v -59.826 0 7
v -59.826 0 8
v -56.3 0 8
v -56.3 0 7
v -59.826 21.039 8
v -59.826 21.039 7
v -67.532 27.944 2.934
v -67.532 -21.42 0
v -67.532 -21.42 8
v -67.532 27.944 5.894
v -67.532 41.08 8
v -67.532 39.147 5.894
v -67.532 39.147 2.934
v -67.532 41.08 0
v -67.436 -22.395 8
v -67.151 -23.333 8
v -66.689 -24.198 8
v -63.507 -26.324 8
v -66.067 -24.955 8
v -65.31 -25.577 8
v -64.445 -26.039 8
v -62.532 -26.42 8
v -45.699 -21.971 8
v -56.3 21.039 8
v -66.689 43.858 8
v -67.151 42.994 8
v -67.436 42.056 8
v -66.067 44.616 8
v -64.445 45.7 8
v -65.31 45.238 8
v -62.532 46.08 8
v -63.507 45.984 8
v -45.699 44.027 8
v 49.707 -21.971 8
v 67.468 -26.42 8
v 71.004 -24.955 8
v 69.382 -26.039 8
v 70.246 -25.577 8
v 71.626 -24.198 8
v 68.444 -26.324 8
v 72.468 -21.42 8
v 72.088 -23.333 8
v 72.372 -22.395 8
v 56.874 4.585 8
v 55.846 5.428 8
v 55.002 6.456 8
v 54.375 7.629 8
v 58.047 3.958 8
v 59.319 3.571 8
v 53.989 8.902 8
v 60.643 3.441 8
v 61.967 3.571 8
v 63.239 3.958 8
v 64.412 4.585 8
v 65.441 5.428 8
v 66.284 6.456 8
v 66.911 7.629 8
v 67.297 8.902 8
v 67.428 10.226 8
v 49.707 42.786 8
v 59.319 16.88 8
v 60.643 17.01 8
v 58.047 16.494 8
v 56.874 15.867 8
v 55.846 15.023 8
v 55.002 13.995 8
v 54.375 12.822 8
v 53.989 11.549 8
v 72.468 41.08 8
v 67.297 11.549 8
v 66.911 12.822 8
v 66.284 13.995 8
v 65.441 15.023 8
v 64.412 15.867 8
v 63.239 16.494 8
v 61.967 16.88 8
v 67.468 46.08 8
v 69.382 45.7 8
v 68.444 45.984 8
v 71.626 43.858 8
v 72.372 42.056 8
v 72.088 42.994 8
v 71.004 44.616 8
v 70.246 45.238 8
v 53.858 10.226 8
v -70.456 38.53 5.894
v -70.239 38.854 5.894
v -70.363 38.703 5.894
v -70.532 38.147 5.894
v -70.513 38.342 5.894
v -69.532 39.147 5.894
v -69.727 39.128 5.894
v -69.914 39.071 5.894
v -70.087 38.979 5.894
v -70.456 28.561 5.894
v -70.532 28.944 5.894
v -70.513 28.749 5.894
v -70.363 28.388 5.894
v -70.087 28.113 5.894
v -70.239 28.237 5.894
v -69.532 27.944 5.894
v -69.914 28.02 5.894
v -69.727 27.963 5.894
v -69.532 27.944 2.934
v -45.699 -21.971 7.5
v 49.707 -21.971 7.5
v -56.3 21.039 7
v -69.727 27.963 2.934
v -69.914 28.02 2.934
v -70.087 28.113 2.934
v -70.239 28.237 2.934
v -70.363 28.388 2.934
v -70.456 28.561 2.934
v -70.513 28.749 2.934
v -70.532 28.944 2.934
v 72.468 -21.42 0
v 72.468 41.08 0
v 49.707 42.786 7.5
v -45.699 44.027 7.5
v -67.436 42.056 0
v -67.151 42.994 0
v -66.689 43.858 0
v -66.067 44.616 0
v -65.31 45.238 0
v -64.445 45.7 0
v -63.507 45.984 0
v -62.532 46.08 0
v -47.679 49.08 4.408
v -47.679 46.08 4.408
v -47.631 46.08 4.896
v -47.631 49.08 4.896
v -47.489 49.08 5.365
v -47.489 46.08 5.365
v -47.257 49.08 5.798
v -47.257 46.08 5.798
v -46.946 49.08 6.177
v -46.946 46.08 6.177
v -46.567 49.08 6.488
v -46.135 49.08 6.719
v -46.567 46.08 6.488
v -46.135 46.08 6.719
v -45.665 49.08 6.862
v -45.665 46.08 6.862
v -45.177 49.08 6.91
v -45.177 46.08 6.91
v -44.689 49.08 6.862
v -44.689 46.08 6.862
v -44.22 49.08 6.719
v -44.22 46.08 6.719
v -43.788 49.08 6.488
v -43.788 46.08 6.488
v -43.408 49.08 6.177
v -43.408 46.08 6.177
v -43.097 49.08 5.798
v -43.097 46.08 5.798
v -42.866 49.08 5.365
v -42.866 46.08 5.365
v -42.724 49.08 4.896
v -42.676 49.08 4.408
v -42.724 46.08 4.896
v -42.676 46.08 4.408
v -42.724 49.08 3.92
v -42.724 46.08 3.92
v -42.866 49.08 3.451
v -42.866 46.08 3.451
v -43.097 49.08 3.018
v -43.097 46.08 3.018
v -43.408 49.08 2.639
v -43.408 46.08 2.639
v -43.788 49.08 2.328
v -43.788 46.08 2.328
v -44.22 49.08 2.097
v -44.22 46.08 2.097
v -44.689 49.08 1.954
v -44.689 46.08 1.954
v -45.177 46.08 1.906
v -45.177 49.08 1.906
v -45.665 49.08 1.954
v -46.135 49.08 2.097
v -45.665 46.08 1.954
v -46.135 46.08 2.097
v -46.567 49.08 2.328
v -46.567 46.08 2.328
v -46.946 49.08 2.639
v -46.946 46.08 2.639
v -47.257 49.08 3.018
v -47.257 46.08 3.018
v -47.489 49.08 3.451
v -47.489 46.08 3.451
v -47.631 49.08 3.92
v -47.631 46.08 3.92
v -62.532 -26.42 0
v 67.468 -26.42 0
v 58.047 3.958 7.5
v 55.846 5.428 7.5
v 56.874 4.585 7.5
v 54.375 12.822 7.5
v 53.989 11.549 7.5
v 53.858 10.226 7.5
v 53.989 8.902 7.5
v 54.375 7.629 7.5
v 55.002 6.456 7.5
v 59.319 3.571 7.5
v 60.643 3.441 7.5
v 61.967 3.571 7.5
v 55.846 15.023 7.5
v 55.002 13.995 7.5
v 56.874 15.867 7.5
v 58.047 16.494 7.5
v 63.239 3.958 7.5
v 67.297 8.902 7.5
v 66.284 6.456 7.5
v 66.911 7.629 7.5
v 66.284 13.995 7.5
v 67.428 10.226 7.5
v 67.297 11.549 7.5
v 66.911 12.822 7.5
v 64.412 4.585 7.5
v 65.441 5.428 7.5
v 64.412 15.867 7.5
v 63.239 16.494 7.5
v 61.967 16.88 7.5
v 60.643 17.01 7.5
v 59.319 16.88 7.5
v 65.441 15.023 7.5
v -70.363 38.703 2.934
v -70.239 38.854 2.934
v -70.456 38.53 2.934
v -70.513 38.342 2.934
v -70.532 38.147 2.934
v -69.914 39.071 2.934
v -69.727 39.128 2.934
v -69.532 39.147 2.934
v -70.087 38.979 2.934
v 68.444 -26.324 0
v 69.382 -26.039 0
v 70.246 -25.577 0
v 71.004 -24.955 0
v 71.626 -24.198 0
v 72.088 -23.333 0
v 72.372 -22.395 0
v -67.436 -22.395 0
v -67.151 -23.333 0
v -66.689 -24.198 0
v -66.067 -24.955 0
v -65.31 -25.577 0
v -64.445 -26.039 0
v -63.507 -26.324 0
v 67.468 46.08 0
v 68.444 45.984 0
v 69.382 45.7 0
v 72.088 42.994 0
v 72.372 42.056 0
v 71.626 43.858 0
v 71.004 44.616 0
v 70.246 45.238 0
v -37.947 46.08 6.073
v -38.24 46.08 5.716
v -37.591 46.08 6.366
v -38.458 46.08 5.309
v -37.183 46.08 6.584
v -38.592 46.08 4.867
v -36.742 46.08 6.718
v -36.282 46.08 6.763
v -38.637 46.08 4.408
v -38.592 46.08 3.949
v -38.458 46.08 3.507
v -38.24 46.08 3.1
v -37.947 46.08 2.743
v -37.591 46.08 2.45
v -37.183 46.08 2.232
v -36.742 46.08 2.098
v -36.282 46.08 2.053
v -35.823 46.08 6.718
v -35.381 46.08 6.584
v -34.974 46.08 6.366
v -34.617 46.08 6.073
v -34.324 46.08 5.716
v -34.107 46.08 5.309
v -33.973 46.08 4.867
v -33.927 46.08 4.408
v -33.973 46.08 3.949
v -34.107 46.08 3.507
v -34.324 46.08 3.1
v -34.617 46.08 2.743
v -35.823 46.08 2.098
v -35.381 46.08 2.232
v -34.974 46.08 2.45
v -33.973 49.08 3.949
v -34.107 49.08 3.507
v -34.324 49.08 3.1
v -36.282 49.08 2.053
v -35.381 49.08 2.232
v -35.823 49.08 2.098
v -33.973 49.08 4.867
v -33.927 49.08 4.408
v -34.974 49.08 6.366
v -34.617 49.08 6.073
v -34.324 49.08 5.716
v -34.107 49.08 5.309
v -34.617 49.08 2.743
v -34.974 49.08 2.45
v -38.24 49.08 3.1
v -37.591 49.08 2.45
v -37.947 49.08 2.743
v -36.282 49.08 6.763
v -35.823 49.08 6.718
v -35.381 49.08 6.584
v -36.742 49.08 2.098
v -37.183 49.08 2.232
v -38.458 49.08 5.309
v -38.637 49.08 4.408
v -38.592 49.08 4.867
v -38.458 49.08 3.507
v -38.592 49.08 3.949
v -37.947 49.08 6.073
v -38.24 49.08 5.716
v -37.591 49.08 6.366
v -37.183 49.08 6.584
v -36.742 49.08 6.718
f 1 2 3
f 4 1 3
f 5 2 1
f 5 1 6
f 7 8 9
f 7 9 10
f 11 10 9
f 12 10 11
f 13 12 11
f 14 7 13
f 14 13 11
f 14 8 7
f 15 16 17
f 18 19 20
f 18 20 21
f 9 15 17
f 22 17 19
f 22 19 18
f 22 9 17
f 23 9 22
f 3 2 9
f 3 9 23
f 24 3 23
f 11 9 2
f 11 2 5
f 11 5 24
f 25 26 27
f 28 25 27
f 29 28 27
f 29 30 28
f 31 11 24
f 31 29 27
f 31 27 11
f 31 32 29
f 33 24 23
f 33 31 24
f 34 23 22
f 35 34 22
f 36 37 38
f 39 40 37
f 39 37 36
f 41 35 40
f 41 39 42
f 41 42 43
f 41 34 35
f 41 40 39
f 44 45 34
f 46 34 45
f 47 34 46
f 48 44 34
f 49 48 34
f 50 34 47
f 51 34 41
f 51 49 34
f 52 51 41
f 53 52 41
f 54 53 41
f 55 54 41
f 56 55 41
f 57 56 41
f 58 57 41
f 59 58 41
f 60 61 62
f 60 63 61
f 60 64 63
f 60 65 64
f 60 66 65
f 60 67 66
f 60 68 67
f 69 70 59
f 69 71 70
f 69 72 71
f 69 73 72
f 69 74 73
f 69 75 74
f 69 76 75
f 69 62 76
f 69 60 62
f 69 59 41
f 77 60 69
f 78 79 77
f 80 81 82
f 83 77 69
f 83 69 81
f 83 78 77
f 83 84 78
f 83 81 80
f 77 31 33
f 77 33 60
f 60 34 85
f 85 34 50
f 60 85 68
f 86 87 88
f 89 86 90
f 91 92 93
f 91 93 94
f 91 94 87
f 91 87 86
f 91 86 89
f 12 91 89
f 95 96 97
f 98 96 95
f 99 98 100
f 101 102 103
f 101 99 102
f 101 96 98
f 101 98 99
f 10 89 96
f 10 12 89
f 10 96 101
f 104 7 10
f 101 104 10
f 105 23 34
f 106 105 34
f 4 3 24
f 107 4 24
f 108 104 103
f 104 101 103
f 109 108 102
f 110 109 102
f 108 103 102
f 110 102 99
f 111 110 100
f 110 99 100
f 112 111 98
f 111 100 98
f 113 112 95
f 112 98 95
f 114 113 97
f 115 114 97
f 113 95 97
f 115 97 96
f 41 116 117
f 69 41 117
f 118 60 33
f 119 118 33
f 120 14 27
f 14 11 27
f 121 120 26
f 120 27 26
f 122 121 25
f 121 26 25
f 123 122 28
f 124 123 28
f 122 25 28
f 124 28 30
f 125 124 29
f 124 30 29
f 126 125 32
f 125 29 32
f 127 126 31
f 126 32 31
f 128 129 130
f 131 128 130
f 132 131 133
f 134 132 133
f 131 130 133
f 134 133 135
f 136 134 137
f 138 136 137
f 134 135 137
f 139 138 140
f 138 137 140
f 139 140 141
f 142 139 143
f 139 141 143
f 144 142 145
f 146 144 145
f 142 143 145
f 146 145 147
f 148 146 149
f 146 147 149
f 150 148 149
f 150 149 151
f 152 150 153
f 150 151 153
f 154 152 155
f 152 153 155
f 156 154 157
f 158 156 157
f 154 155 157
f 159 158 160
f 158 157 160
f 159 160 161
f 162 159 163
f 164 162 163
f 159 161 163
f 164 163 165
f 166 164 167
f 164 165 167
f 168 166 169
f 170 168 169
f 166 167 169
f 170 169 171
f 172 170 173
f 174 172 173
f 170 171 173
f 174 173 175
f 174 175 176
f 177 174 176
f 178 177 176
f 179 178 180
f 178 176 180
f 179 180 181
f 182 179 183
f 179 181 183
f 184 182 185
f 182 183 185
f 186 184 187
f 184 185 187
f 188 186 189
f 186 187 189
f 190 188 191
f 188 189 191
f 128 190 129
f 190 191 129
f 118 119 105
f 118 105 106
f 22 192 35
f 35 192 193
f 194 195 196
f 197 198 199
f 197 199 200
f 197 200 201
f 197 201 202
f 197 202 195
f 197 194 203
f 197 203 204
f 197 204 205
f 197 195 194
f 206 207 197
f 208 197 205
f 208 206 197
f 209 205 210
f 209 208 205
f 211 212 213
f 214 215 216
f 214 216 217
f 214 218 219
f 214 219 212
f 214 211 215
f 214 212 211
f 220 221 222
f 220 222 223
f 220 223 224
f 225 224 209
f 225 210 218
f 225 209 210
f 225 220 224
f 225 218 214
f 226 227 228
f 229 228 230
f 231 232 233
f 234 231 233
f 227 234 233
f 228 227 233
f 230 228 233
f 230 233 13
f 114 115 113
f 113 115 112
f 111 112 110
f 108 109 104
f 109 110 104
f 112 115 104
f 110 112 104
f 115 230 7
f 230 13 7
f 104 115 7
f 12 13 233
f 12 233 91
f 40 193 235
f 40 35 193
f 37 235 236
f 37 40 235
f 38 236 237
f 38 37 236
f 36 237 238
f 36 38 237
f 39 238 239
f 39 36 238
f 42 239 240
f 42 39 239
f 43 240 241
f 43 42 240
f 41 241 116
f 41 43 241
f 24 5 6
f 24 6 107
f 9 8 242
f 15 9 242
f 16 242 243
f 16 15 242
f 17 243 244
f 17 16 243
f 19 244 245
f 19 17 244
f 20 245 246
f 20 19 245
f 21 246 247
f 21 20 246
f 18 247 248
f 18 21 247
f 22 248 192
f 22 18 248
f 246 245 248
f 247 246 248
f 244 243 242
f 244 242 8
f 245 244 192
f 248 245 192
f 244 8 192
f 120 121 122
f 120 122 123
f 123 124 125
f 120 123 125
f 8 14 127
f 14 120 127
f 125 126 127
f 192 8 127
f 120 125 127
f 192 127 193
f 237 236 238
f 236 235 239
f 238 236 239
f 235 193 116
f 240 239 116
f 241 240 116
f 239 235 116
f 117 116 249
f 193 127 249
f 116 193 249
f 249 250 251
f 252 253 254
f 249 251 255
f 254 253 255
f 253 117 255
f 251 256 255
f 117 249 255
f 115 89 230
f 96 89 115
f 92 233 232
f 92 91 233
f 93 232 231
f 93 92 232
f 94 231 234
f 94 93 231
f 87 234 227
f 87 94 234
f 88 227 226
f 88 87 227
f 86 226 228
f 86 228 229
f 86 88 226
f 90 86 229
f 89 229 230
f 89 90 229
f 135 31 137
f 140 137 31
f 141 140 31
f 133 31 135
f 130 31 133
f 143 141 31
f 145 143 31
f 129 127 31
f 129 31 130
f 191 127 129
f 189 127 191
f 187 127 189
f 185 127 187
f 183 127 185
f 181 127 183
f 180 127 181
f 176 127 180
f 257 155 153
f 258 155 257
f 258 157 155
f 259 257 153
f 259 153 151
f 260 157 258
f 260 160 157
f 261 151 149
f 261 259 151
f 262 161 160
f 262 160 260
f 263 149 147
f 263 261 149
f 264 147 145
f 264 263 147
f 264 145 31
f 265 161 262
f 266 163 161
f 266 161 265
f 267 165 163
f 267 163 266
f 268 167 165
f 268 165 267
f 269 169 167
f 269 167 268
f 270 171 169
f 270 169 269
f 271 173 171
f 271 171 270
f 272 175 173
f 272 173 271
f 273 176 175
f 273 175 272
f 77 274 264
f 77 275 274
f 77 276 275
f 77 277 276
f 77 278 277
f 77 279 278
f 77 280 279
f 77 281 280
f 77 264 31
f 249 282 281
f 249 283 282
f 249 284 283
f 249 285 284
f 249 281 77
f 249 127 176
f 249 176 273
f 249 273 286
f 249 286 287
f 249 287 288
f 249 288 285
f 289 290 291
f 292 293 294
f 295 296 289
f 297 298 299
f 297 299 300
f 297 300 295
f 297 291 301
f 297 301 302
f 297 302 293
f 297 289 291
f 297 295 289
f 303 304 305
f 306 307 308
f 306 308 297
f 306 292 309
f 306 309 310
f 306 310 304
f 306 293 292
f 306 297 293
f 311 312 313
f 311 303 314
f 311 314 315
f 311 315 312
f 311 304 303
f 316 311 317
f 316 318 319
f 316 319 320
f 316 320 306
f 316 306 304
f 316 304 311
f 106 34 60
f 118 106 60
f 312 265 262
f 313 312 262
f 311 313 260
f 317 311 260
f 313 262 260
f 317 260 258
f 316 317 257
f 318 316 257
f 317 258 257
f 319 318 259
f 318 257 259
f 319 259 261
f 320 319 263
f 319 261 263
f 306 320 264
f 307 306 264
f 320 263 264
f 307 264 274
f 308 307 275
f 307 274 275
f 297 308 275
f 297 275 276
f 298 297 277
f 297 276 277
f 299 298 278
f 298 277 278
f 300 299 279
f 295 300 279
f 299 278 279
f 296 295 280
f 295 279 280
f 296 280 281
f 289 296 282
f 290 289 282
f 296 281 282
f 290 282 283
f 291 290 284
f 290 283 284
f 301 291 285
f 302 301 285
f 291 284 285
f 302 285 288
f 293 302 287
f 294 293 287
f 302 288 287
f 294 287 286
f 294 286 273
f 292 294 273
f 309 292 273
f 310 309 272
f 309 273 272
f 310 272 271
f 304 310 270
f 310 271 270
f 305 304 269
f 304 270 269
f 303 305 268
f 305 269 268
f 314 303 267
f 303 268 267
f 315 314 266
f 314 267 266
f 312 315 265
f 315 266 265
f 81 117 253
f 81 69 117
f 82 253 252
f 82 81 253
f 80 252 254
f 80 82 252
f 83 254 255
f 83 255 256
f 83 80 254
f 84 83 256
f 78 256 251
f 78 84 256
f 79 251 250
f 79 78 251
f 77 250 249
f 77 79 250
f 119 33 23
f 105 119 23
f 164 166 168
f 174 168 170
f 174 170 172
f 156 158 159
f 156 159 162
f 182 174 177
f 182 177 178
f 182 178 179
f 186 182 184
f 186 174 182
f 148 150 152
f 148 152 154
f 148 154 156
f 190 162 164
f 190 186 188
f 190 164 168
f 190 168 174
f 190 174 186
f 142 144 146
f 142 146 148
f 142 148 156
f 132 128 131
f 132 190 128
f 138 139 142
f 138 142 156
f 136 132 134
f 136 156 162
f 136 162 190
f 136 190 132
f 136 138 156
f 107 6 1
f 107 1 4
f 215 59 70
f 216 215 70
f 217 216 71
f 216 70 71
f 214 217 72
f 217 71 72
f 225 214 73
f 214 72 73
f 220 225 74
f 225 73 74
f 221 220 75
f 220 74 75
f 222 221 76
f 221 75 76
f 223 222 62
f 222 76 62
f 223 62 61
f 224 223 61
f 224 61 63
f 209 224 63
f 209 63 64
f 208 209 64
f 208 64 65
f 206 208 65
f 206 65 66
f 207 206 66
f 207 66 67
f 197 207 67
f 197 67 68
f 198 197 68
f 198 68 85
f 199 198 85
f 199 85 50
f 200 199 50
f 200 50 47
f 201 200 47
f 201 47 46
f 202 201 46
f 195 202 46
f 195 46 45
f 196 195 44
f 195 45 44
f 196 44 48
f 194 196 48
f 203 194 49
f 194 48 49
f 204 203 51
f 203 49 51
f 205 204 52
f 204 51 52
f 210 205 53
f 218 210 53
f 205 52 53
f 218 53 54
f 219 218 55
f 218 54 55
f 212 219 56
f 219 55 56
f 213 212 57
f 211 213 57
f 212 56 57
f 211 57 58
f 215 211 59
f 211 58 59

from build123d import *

# Parameters (mm, degrees)
F0_W      = 140
F0_H      = 72.5
F1_DEPTH  = 8
F2_R      = 5
F4_R      = 6.784666
F5_DEPTH  = 0.5
F7_DEPTH  = 0.5
F5_FACE_R = 6.784666
F8_DEPTH  = 1
F9_W      = 3.526121
F9_H      = 21.039179
F10_DEPTH = 1
F11_W     = 11.203378
F11_H     = 2.960671
F12_DEPTH = 3
F13_R     = 1
F14_R     = 2.501655
F14_R_2   = 2.354917
F15_DEPTH = 3


with BuildPart() as f1:
    # F0 (on Top) → F1 (new body)
    with BuildSketch(Plane.XY):
        with Locations((2.468213, 9.830183)):
            Rectangle(F0_W, F0_H)
    extrude(amount=F1_DEPTH)

    # F2
    f2_edges = [f1.edges().sort_by_distance(p)[0] for p in [
        (72.468213, -26.419817, 4),
        (72.468213, 46.080183, 4),
        (-67.531787, -26.419817, 4),
        (-67.531787, 46.080183, 4),
    ]]
    fillet(f2_edges, radius=F2_R)

    # F4 (on face) → F5 (join)
    with BuildSketch(Plane.XY.offset(8)):
        with Locations((60.643088, 10.225745)):
            Circle(F4_R)
    extrude(amount=F5_DEPTH)

    # F6 (on face) → F7 (cut)
    with BuildSketch(Plane.XY.offset(8)):
        Polygon((49.707294, 42.785898), (-45.698922, 44.026859), (-45.698922, -21.970822), (49.707294, -21.970822), align=None)
    extrude(amount=-F7_DEPTH, mode=Mode.SUBTRACT)

    # F5_face (on face) → F8 (cut)
    with BuildSketch(Plane(origin=(60.643088, 10.225745, 8.5), x_dir=(1, 0, 0), z_dir=(0, 0, 1))):
        Circle(F5_FACE_R)
    extrude(amount=-F8_DEPTH, mode=Mode.SUBTRACT)

    # F9 (on face) → F10 (cut)
    with BuildSketch(Plane.XY.offset(8)):
        with Locations((-58.063432, 10.51959)):
            Rectangle(F9_W, F9_H)
    extrude(amount=-F10_DEPTH, mode=Mode.SUBTRACT)

    # F11 (on face) → F12 (join)
    with BuildSketch(Plane(origin=(-67.531787, 0, 0), x_dir=(0, -1, 0), z_dir=(-1, 0, 0))):
        with Locations((-33.545699, 4.414106)):
            Rectangle(F11_W, F11_H)
    extrude(amount=F12_DEPTH)

    # F13
    f13_edges = [f1.edges().sort_by_distance(p)[0] for p in [
        (-70.531787, 27.94401, 4.414106),
        (-70.531787, 39.147388, 4.414106),
    ]]
    fillet(f13_edges, radius=F13_R)

    # F14 (on face) → F15 (join)
    with BuildSketch(Plane(origin=(0, 46.080183, 0), x_dir=(-1, 0, 0), z_dir=(0, 1, 0))):
        with Locations((45.177385, 4.408034)):
            Circle(F14_R)
        with Locations((36.282312, 4.408034)):
            Circle(F14_R_2)
    extrude(amount=F15_DEPTH)


solid = f1.part
